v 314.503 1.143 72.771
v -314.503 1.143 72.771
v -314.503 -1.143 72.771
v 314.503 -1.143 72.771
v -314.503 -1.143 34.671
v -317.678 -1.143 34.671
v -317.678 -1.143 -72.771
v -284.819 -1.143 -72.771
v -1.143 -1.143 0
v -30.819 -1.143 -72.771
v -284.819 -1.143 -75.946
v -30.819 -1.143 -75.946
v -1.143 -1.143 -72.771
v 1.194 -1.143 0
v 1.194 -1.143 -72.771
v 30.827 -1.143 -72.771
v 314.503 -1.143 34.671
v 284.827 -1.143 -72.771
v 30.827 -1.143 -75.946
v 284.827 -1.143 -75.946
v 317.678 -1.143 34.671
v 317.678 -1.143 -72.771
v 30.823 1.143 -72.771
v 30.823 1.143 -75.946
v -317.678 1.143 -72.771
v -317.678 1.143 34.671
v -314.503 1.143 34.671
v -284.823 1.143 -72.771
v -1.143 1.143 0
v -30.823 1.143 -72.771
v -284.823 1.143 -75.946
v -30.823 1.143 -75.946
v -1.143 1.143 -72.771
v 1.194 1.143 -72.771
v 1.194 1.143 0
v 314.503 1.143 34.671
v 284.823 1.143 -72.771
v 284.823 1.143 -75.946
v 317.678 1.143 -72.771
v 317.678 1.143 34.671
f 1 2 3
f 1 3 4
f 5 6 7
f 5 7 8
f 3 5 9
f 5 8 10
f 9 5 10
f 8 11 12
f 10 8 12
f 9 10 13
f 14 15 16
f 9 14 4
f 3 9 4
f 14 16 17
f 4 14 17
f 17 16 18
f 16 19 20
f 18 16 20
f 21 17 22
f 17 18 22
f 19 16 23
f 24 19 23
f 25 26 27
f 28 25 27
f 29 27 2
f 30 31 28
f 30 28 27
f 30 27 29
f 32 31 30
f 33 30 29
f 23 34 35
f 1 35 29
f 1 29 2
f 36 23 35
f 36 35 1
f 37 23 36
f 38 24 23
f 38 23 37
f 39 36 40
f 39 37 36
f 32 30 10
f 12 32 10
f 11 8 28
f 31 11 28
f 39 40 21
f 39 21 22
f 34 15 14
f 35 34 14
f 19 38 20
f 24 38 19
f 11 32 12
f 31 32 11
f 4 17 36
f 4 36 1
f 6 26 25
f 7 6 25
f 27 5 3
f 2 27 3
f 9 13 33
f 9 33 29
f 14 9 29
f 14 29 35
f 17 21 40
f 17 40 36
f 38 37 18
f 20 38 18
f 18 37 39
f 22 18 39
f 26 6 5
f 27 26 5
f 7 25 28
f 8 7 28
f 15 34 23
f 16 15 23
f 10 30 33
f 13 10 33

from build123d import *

# Parameters (mm, degrees)
SKETCH1_W           = 635.3556
SKETCH1_H           = 145.542
BOSS_EXTRUDE1_DEPTH = 1.143
BOSS_EXTRUDE2_DEPTH = 3.175
SKETCH3_W           = 3.175
SKETCH3_H           = 38.1
CUT_EXTRUDE1_DEPTH  = 327.637727957
SKETCH4_W           = 2.3368
SKETCH4_H           = 72.771
CUT_EXTRUDE2_DEPTH  = 327.637727957


with BuildPart() as part:
    # Sketch1 → Boss-Extrude1 (new, symmetric)
    with BuildSketch(Plane(origin=(0, 0, 0), x_dir=(1, 0, 0), z_dir=(0, 1, 0))):
        Rectangle(SKETCH1_W, SKETCH1_H)
    extrude(amount=BOSS_EXTRUDE1_DEPTH, both=True)

    # Sketch2 → Boss-Extrude2 (add)
    with BuildSketch(Plane(origin=(0, 0, -72.771), x_dir=(-1, 0, 0), z_dir=(0, 0, -1))):
        Polygon((-284.8269005, -1.143), (-30.826511563, -1.143), (-30.822511063, 1.143), (-284.8229, 1.143), align=None)
        Polygon((30.8188995, -1.143), (284.819288437, -1.143), (284.823288937, 1.143), (30.8229, 1.143), align=None)
    extrude(amount=BOSS_EXTRUDE2_DEPTH)

    # Sketch3 → Cut-Extrude1 (cut, through all)
    with BuildSketch(Plane.XZ.offset(1.143)):
        with Locations((-316.0903, 53.721)):
            Rectangle(SKETCH3_W, SKETCH3_H)
    cut_extrude1 = extrude(amount=-CUT_EXTRUDE1_DEPTH, mode=Mode.SUBTRACT)

    # Mirror1: Cut-Extrude1 across plane
    add(cut_extrude1.mirror(Plane(origin=(0, 0, 0), x_dir=(0, 0, 1), z_dir=(1, 0, 0))), mode=Mode.SUBTRACT)

    # Sketch4 → Cut-Extrude2 (cut, through all)
    with BuildSketch(Plane.XZ.offset(1.143)):
        with Locations((0.0254, -36.3855)):
            Rectangle(SKETCH4_W, SKETCH4_H)
    extrude(amount=-CUT_EXTRUDE2_DEPTH, mode=Mode.SUBTRACT)


solid = part.part
